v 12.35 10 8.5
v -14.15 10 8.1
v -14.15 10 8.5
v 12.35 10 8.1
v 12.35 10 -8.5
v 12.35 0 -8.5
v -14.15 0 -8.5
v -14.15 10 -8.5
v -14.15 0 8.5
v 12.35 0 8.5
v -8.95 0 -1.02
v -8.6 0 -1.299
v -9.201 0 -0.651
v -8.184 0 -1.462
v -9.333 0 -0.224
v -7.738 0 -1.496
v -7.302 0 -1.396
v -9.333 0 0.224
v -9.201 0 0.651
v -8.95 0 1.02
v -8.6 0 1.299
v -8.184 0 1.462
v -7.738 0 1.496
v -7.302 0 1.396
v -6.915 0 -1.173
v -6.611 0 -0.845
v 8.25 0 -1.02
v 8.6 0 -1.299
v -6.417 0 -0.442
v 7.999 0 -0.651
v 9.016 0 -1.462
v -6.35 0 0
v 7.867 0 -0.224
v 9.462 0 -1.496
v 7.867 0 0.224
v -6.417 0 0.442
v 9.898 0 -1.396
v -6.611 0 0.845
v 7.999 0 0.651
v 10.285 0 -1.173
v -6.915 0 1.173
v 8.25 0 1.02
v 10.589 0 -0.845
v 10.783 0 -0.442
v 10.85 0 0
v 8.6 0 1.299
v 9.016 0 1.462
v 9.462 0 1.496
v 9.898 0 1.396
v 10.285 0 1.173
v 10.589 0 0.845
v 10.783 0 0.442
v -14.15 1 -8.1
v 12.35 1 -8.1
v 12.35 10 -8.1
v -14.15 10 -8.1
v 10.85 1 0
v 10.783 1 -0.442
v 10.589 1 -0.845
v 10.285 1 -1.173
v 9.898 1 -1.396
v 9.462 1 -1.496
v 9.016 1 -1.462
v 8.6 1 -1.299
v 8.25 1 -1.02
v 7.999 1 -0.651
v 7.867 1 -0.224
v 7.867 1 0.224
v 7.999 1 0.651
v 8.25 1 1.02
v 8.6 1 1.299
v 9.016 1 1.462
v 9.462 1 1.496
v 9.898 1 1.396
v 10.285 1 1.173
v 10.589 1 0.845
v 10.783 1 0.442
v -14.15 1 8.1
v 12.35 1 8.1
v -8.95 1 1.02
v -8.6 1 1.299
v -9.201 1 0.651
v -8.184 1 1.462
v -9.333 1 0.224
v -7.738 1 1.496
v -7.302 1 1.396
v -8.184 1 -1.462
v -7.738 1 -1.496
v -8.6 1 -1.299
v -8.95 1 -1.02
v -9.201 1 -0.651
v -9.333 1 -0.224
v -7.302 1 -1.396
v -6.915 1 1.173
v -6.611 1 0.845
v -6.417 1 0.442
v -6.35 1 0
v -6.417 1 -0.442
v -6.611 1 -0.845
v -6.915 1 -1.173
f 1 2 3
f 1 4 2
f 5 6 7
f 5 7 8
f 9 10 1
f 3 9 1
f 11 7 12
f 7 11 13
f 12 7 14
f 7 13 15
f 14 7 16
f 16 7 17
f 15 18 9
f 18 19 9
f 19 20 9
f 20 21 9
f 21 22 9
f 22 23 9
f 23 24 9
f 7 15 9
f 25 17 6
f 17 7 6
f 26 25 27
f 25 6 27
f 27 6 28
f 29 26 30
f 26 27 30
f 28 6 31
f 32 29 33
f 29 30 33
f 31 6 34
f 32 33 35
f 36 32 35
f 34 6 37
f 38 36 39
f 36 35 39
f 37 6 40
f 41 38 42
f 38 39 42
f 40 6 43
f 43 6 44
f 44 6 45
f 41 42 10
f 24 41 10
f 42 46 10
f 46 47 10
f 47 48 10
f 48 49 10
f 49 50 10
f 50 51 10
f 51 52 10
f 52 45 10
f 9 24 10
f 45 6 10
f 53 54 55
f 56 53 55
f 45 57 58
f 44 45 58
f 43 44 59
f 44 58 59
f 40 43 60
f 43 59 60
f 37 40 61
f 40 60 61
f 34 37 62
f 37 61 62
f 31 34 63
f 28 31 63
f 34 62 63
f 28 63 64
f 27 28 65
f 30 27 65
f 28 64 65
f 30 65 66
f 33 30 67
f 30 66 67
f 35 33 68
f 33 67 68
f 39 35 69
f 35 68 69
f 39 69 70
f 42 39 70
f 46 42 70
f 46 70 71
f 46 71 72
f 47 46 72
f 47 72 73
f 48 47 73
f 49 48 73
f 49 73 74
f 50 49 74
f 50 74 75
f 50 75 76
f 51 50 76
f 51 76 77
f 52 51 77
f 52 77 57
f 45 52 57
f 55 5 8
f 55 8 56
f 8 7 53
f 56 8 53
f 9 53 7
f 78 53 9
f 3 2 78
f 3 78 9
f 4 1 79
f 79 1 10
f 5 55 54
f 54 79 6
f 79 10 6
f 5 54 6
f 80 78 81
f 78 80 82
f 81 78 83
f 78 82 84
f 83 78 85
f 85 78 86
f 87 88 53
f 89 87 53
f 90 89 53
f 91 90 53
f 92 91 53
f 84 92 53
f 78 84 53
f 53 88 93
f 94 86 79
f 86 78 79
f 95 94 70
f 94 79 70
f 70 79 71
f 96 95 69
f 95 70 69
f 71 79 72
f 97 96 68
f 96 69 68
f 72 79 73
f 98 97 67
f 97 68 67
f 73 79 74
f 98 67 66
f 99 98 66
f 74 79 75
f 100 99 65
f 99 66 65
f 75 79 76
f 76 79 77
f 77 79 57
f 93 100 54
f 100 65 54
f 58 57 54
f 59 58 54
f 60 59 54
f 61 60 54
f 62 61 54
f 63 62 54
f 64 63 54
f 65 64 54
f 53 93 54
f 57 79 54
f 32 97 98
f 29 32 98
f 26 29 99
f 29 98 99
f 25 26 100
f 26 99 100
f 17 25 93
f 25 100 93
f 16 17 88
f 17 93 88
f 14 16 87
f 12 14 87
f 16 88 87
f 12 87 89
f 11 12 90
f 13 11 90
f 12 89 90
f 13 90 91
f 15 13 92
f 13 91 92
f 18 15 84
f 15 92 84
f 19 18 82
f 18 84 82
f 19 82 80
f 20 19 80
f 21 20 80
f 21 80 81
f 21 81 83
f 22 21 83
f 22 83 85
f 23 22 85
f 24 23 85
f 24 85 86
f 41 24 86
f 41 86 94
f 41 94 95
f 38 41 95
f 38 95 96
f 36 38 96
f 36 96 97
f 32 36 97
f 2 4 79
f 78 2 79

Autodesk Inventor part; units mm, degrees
ref_plane "YZ Plane" through (0, 0, 0) normal (1, 0, 0) x (0, 1, 0)
ref_plane "XZ Plane" through (0, 0, 0) normal (0, 1, 0) x (-1, 0, 0)
ref_plane "XY Plane" through (0, 0, 0) normal (0, 0, 1) x (1, 0, 0)
sketch "Sketch1" plane through (0, 0, 0) normal (0, 1, 0) x (-1, 0, 0)
  line L0 (12.35, 8.5) -> (-12.35, 8.5)
  line L1 (-12.35, 8.5) -> (-12.35, -8.5)
  line L2 (-12.35, -8.5) -> (12.35, -8.5)
  line L3 (12.35, -8.5) -> (12.35, 8.5)
  line L4 (12.35, 8.5) -> (-12.35, -8.5) construction
  line L5 (-12.35, 8.5) -> (12.35, -8.5) construction
  point P0 (0, 0)
  dimension "d0" = 24.7
  dimension "d1" = 17
extrude "Extrusion1" add sketch "Sketch1" along normal blind 10
sketch "Sketch2" plane through (0, 10, 0) normal (0, 1, 0) x (1, 0, 0)
  line L0 (-12.35, 8.1) -> (12.35, 8.1)
  line L1 (12.35, 8.1) -> (12.35, -8.1)
  line L2 (12.35, -8.1) -> (-12.35, -8.1)
  line L3 (-12.35, -8.1) -> (-12.35, 8.1)
  line L4 (-12.35, 8.1) -> (12.35, -8.1) construction
  line L5 (12.35, 8.1) -> (-12.35, -8.1) construction
  point P0 (0, 0)
  dimension "d4" = 24.7
  dimension "d5" = 16.2
extrude "Extrusion2" cut sketch "Sketch2" against normal blind 9
sketch "Sketch3" plane through (0, 0, 0) normal (0, -1, 0) x (1, 0, 0)
  line L0 (-12.35, -8.5) -> (-12.35, 8.5) projected
  line L1 (12.35, 8.5) -> (12.35, -8.5) projected
  line L2 (-12.35, 0) -> (-9.35, 0)
  circle A0 centre (-9.35, 0) radius 1.5
  line L3 (12.35, 0) -> (9.35, 0)
  circle A1 centre (9.35, 0) radius 1.5
  point P0 (0, 0)
  dimension "d8" = 3
  dimension "d9" = 3
  dimension "d10" = 3
  dimension "d11" = 3
extrude "Extrusion3" cut sketch "Sketch3" against normal blind 1
sketch "Sketch4" plane through (-12.35, 0, -8.5) normal (-1, 0, 0) x (0, 0, 1)
  line L0 (0.4, 1) -> (0.4, 10) projected
  line L1 (0, 10) -> (0.4, 10) projected
  line L2 (0, 0) -> (0, 10) projected
  line L3 (0, 0) -> (17, 0) projected
  line L4 (17, 0) -> (17, 10) projected
  line L5 (16.6, 10) -> (17, 10) projected
  line L6 (16.6, 10) -> (16.6, 1) projected
  line L7 (16.6, 1) -> (0.4, 1) projected
  point P0 (8.5, 0)
extrude "Extrusion4" add sketch "Sketch4" along normal blind 2
sketch "Sketch5" plane through (-14.35, 0, -8.5) normal (-1, 0, 0) x (0, 0, 1)
  line L0 (0.4, 1) -> (0.4, 10) projected
  line L1 (0.4, 10) -> (0, 10) projected
  line L2 (0, 10) -> (0, 0) projected
  line L3 (0, 0) -> (17, 0) projected
  line L4 (17, 0) -> (17, 10) projected
  line L5 (17, 10) -> (16.6, 10) projected
  line L6 (16.6, 10) -> (16.6, 1) projected
  line L7 (16.6, 1) -> (0.4, 1) projected
  point P0 (8.5, 0)
extrude "Extrusion5" cut sketch "Sketch5" against normal blind 0.2
sketch "Sketch6" plane through (0, 0, 0) normal (0, -1, 0) x (1, 0, 0)
  line L0 (-14.15, 8.5) -> (-14.15, -8.5) projected
  line L1 (-14.15, 8.5) -> (12.35, 8.5) projected
  circle A0 centre (-9.35, 0) radius 1.5 projected
  line L2 (-14.15, 0) -> (-12.15, 0)
  line L3 (-12.15, 0) -> (-10.15, 0)
  line L4 (-10.15, 0) -> (-7.15, 0)
  point P0 (0, 0)
  dimension "d18" = 2
  dimension "d19" = 2
  dimension "d20" = 3
extrude "Extrusion6" add sketch "Sketch6" against normal blind 1
sketch "Sketch7" plane through (0, 0, 0) normal (0, -1, 0) x (1, 0, 0)
  line L0 (-14.15, 8.5) -> (-14.15, -8.5) projected
  line L1 (-14.15, 8.5) -> (12.35, 8.5) projected
  line L2 (-14.15, 0) -> (-10.85, 0)
  line L3 (-10.85, 0) -> (-7.85, 0)
  circle A0 centre (-7.85, 0) radius 1.5
  point P0 (0, 0)
  dimension "d29" = 3.3
  dimension "d30" = 3
  dimension "d31" = 3
extrude "Extrusion7" cut sketch "Sketch7" against normal blind 1
sketch "Sketch8" plane through (0, 1, 0) normal (0, 1, 0) x (1, 0, 0)
  circle A0 centre (-7.85, 0) radius 1.5 projected
  circle A1 centre (9.35, 0) radius 1.5 projected
  circle A2 centre (9.35, 0) radius 0.05
  circle A3 centre (-7.85, 0) radius 0.05
  point P0 (0, 0)
  dimension "d34" = 0.1
  dimension "d35" = 0.1
extrude "Extrusion8" add sketch "Sketch8" against normal blind 1
sketch "Sketch9" plane through (0, 1, 0) normal (0, 1, 0) x (1, 0, 0)
  circle A0 centre (-7.85, 0) radius 0.05 projected
  circle A1 centre (9.35, 0) radius 0.05 projected
  circle A2 centre (-7.85, 0) radius 1.5
  circle A3 centre (9.35, 0) radius 1.5
  point P0 (0, 0)
  dimension "d38" = 3
  dimension "d39" = 3
extrude "Extrusion9" cut sketch "Sketch9" against normal blind 1
properties part number "kolejnicka_ruka"
